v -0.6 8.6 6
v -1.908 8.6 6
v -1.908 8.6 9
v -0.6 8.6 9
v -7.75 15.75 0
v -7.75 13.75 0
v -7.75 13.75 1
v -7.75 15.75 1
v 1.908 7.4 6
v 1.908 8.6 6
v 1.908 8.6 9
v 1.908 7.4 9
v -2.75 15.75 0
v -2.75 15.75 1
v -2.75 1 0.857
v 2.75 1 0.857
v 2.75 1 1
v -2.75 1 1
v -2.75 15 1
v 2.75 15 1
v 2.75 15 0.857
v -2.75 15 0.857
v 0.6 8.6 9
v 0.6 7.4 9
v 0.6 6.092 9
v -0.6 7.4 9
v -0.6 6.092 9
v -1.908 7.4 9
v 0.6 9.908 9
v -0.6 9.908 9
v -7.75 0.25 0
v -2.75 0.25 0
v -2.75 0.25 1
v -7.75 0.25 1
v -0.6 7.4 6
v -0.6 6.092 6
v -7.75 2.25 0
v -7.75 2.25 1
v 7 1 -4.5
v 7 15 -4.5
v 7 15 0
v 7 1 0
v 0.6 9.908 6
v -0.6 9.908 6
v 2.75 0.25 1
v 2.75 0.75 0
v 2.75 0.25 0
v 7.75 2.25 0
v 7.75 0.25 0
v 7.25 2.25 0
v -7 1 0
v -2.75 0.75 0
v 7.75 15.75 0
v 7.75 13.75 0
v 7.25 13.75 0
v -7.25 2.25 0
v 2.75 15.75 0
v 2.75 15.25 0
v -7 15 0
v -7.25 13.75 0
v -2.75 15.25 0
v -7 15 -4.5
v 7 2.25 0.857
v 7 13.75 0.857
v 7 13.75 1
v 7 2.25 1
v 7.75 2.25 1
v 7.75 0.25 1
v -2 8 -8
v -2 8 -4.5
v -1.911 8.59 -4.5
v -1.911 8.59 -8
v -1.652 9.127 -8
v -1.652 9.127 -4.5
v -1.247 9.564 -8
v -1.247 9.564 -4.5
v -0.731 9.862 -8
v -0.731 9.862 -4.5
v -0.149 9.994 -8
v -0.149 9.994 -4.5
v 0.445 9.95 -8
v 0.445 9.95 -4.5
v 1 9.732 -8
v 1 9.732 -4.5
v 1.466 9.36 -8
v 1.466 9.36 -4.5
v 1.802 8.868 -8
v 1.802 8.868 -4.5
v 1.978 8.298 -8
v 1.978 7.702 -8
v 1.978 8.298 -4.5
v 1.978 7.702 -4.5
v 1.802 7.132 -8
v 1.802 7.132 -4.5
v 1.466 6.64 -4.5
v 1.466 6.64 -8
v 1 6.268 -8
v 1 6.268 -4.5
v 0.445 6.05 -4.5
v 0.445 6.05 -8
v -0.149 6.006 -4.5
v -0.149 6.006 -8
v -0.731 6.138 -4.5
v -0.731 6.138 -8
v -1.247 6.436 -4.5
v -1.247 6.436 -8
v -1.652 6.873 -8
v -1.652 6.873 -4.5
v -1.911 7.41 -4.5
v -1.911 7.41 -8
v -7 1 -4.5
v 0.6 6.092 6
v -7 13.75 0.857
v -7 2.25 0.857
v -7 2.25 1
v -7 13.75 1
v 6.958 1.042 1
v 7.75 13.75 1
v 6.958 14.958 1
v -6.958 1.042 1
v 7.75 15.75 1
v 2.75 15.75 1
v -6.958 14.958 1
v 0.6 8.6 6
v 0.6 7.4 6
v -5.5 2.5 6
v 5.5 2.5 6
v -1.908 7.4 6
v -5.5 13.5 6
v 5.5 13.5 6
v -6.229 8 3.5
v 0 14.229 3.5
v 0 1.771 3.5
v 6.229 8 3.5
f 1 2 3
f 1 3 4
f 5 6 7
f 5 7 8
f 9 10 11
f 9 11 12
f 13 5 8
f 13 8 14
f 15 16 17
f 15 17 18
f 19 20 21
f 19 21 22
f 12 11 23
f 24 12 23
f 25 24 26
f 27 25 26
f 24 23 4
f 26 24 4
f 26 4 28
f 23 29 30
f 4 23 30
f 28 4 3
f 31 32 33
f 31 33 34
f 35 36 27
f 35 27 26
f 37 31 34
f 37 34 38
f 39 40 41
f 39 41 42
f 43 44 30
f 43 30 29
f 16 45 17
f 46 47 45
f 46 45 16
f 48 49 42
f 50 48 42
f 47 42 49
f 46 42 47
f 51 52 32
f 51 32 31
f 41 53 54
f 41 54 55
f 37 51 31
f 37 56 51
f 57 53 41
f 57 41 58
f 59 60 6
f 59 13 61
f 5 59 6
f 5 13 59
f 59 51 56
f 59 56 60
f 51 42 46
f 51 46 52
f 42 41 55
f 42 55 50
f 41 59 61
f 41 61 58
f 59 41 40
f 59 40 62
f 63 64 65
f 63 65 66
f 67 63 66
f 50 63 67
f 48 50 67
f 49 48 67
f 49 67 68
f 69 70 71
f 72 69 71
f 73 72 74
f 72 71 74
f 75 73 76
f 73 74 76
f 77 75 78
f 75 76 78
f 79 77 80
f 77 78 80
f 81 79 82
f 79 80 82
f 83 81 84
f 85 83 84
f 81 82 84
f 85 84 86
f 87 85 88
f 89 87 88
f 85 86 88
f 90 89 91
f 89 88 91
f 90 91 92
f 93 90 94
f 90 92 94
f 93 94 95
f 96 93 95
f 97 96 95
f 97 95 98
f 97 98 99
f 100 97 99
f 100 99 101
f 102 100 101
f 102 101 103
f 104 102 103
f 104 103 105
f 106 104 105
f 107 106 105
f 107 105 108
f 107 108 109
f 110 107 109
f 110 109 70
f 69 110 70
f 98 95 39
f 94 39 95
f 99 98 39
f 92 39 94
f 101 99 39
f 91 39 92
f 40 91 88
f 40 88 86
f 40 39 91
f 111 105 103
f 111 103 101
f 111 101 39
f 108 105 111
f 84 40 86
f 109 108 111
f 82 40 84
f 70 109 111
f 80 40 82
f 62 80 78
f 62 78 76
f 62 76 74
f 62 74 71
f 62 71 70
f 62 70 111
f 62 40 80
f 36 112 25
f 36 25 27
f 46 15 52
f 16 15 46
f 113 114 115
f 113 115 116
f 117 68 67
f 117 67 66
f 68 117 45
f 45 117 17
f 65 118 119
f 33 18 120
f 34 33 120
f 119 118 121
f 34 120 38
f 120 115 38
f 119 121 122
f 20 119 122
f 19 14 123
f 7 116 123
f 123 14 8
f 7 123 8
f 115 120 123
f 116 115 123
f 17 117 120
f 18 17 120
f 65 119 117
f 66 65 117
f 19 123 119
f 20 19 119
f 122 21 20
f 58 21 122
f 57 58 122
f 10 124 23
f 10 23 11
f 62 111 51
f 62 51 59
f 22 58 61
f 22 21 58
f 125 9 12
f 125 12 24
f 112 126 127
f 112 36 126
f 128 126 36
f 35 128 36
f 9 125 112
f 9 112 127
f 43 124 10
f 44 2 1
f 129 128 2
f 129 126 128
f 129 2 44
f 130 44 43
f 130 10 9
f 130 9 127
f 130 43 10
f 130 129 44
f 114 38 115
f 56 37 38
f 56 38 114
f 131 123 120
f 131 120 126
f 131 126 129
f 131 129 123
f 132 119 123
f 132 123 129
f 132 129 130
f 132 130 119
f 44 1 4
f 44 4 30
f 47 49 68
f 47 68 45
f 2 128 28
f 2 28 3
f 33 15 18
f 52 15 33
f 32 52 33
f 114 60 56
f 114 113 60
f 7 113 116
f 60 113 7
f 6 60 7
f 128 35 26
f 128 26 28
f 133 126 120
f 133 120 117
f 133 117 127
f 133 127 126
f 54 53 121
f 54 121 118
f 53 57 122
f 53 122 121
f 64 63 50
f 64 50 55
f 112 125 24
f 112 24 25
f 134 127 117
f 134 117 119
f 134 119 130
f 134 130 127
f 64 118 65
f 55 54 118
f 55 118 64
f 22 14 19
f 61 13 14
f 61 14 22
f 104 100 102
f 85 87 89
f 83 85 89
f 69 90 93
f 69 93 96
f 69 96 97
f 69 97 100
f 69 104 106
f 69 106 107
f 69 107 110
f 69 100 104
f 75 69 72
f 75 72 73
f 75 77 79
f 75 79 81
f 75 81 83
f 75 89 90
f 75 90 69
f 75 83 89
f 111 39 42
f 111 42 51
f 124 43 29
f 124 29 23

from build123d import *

# Parameters (mm, degrees)
BOX017_W          = 14
BOX017_H          = 14
BOX017_DEPTH      = 4.5
CYLINDER095_R     = 2
CYLINDER095_DEPTH = 8
PAD089_DEPTH      = 1
SKETCH155_W       = 14.5
SKETCH155_H       = 14.5
SKETCH156_W       = 11
SKETCH156_H       = 11
PAD090_DEPTH      = 9
SKETCH158_W       = 7.5
SKETCH158_H       = 6
PAD092_DEPTH      = 1


with BuildPart() as part:
    # Box017 → Box017 (join)
    with BuildSketch(Plane(origin=(7, -7, 0), x_dir=(-1, 0, 0), z_dir=(0, 0, -1))):
        with Locations((7, 7)):
            Rectangle(BOX017_W, BOX017_H)
    extrude(amount=BOX017_DEPTH)

    # Cylinder095 → Cylinder095 (join)
    with BuildSketch(Plane(origin=(0, 0, 0), x_dir=(-1, 0, 0), z_dir=(0, 0, -1))):
        Circle(CYLINDER095_R)
    extrude(amount=CYLINDER095_DEPTH)

    # Sketch154 → Pad089 (join)
    with BuildSketch(Plane.XY):
        Polygon((-7.75, 5.75), (-7.75, 7.75), (-2.75, 7.75), (-2.75, 7), (2.75, 7), (2.75, 7.75), (7.75, 7.75), (7.75, 5.75), (7, 5.75), (7, -5.75), (7.75, -5.75), (7.75, -7.75), (2.75, -7.75), (2.75, -7), (-2.75, -7), (-2.75, -7.75), (-7.75, -7.75), (-7.75, -5.75), (-7, -5.75), (-7, 5.75), align=None)
    extrude(amount=PAD089_DEPTH)

    # Sketch155 → AdditiveLoft002 section 0
    with BuildSketch(Plane.XY):
        Rectangle(SKETCH155_W, SKETCH155_H)
    # Sketch156 → AdditiveLoft002 section 1
    with BuildSketch(Plane.XY.offset(6)):
        Rectangle(SKETCH156_W, SKETCH156_H)
    loft()

    # Sketch157 → Pad090 (join)
    with BuildSketch(Plane.XY):
        Polygon((-0.6, 1.907878), (0.6, 1.907878), (0.6, 0.6), (1.907878, 0.6), (1.907878, -0.6), (0.6, -0.6), (0.6, -1.907878), (-0.6, -1.907878), (-0.6, -0.6), (-1.907878, -0.6), (-1.907878, 0.6), (-0.6, 0.6), align=None)
    extrude(amount=PAD090_DEPTH)

    # Sketch158 → Pad092 (join)
    with BuildSketch(Plane.XY.offset(5)):
        Rectangle(SKETCH158_W, SKETCH158_H)
    extrude(amount=PAD092_DEPTH)


with BuildPart() as part_1:
    # Body181003 placement: moved
    add(part.part.moved(Location((0, 8, 0))))


solid = part_1.part
